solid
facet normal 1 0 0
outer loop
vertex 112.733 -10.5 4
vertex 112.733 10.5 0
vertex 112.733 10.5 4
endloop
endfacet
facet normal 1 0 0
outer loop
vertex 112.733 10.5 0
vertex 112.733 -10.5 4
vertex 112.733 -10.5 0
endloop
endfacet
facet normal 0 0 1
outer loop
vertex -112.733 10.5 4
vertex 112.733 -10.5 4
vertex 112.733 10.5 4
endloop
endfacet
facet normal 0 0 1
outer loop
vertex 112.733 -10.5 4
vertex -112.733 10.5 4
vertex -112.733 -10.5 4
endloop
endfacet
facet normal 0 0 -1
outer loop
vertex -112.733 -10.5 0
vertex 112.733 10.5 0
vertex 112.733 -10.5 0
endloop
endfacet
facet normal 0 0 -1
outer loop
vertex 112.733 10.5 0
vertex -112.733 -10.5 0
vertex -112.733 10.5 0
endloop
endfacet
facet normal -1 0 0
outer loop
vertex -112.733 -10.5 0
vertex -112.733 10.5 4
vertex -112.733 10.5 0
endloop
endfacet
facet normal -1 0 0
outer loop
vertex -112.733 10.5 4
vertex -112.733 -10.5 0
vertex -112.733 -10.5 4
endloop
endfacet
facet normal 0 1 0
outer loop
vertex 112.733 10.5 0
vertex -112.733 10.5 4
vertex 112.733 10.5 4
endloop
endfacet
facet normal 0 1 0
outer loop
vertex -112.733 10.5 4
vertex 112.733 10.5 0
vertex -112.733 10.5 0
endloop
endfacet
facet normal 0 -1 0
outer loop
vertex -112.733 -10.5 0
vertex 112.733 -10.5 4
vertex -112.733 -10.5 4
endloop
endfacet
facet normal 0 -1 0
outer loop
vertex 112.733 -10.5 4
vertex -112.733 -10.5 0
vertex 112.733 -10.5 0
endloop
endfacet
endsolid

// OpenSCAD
dietMode = false;
atkinsMode = true;
hexagonWidth = (213.2 + 0.4)/6; /*106.6*2; 213.2; 35.5*/
fiddle = 0.2;
depth = 30;
height = (atkinsMode ? 4 : 6);
seaHeight = 1.5;

// Image stuff
dataFile = "./edgepicTEST1.dat";
imageWidth = 1240;
embossDepth = (atkinsMode ? 0.8 : 0.5);

/*
cah
c = a / h
h = a / c
hexWidth/2 / cos(30) = a = 20.5
*/

hexagonEdge = hexagonWidth/2 / cos(30);

bobbleRatio = 4;
bobbleOffset = 0.6;
bobbleTolerance = 1;

innerWidth =  5 * hexagonWidth + 2 * ((2*hexagonEdge * cos(30)) - hexagonEdge / (2 * cos(30)));
outerWidth = innerWidth + 2 * (tan(30) * depth) * (atkinsMode ? 0 : 1);
imageScale = innerWidth/imageWidth;

echo("InnerWidth: ", innerWidth);
echo("OuterWidth: ", outerWidth);

if (!dietMode && !atkinsMode) {
difference() {
	translate([0, -outerWidth/2 / tan(30) + depth/2, seaHeight/2]) {
		cylinder(h=seaHeight, r=outerWidth, center=true, $fn=2000);
	}
	translate([0, -outerWidth, height/2]) {
		cube(size=[outerWidth*2,depth+outerWidth*2,height+2*fiddle], center=true);
	}
}
}


translate([0, 0, height/2]) {
difference() {
	cube(size=[outerWidth,depth * (atkinsMode ? 0.7 : 1),height], center=true);

if (!atkinsMode) {
	translate([-outerWidth/2 - depth/2 * tan(30),0,0]) {
		rotate(-60) {
			cube(size=[outerWidth*2,depth,height+2*fiddle], center=true);
		}
	}
	translate([outerWidth/2 + depth/2 * tan(30),0,0]) {
		rotate(60) {
			cube(size=[outerWidth*2,depth,height+2*fiddle], center=true);
		}
	}
	translate([-outerWidth/2 + depth/2*tan(30), 0, 0]) {
		rotate(30) {
			translate([bobbleOffset*depth/(bobbleRatio),0,0]) {
				cylinder(h= height+2*fiddle, r= depth/bobbleRatio, center=true, $fn=200);
			}
		}
	}
	for (i = [-3:3]) {
		translate([i*hexagonEdge*2*cos(30), -depth/2 - hexagonEdge/2, 0]) {
			rotate(30) {
				cylinder(h=height+2*fiddle, r=hexagonEdge, center=true, $fn=6)
;
			}
		}
	}
	if (dietMode) {
		translate([outerWidth*0.025, depth/4+fiddle, 0]) {
			cube(size=[outerWidth*0.85, depth*0.5, height+2*fiddle], center=true);
		}
	}

}
translate([0, (atkinsMode ? 0 : depth/6), height/2+fiddle]) {
    scale([imageScale, -imageScale, -1/256 * height * embossDepth]) {
        surface(file = dataFile, center=true);
    }
}


}
}
if (!atkinsMode) {
	translate([outerWidth/2 - depth/2*tan(30), 0, height/2]) {
		rotate(-30) {
			translate([bobbleOffset*depth/(bobbleRatio),0,0]) {
				cylinder(h= height, r= depth/bobbleRatio - bobbleTolerance/2, center=true, $fn=200);
			}
		}
	}
}
